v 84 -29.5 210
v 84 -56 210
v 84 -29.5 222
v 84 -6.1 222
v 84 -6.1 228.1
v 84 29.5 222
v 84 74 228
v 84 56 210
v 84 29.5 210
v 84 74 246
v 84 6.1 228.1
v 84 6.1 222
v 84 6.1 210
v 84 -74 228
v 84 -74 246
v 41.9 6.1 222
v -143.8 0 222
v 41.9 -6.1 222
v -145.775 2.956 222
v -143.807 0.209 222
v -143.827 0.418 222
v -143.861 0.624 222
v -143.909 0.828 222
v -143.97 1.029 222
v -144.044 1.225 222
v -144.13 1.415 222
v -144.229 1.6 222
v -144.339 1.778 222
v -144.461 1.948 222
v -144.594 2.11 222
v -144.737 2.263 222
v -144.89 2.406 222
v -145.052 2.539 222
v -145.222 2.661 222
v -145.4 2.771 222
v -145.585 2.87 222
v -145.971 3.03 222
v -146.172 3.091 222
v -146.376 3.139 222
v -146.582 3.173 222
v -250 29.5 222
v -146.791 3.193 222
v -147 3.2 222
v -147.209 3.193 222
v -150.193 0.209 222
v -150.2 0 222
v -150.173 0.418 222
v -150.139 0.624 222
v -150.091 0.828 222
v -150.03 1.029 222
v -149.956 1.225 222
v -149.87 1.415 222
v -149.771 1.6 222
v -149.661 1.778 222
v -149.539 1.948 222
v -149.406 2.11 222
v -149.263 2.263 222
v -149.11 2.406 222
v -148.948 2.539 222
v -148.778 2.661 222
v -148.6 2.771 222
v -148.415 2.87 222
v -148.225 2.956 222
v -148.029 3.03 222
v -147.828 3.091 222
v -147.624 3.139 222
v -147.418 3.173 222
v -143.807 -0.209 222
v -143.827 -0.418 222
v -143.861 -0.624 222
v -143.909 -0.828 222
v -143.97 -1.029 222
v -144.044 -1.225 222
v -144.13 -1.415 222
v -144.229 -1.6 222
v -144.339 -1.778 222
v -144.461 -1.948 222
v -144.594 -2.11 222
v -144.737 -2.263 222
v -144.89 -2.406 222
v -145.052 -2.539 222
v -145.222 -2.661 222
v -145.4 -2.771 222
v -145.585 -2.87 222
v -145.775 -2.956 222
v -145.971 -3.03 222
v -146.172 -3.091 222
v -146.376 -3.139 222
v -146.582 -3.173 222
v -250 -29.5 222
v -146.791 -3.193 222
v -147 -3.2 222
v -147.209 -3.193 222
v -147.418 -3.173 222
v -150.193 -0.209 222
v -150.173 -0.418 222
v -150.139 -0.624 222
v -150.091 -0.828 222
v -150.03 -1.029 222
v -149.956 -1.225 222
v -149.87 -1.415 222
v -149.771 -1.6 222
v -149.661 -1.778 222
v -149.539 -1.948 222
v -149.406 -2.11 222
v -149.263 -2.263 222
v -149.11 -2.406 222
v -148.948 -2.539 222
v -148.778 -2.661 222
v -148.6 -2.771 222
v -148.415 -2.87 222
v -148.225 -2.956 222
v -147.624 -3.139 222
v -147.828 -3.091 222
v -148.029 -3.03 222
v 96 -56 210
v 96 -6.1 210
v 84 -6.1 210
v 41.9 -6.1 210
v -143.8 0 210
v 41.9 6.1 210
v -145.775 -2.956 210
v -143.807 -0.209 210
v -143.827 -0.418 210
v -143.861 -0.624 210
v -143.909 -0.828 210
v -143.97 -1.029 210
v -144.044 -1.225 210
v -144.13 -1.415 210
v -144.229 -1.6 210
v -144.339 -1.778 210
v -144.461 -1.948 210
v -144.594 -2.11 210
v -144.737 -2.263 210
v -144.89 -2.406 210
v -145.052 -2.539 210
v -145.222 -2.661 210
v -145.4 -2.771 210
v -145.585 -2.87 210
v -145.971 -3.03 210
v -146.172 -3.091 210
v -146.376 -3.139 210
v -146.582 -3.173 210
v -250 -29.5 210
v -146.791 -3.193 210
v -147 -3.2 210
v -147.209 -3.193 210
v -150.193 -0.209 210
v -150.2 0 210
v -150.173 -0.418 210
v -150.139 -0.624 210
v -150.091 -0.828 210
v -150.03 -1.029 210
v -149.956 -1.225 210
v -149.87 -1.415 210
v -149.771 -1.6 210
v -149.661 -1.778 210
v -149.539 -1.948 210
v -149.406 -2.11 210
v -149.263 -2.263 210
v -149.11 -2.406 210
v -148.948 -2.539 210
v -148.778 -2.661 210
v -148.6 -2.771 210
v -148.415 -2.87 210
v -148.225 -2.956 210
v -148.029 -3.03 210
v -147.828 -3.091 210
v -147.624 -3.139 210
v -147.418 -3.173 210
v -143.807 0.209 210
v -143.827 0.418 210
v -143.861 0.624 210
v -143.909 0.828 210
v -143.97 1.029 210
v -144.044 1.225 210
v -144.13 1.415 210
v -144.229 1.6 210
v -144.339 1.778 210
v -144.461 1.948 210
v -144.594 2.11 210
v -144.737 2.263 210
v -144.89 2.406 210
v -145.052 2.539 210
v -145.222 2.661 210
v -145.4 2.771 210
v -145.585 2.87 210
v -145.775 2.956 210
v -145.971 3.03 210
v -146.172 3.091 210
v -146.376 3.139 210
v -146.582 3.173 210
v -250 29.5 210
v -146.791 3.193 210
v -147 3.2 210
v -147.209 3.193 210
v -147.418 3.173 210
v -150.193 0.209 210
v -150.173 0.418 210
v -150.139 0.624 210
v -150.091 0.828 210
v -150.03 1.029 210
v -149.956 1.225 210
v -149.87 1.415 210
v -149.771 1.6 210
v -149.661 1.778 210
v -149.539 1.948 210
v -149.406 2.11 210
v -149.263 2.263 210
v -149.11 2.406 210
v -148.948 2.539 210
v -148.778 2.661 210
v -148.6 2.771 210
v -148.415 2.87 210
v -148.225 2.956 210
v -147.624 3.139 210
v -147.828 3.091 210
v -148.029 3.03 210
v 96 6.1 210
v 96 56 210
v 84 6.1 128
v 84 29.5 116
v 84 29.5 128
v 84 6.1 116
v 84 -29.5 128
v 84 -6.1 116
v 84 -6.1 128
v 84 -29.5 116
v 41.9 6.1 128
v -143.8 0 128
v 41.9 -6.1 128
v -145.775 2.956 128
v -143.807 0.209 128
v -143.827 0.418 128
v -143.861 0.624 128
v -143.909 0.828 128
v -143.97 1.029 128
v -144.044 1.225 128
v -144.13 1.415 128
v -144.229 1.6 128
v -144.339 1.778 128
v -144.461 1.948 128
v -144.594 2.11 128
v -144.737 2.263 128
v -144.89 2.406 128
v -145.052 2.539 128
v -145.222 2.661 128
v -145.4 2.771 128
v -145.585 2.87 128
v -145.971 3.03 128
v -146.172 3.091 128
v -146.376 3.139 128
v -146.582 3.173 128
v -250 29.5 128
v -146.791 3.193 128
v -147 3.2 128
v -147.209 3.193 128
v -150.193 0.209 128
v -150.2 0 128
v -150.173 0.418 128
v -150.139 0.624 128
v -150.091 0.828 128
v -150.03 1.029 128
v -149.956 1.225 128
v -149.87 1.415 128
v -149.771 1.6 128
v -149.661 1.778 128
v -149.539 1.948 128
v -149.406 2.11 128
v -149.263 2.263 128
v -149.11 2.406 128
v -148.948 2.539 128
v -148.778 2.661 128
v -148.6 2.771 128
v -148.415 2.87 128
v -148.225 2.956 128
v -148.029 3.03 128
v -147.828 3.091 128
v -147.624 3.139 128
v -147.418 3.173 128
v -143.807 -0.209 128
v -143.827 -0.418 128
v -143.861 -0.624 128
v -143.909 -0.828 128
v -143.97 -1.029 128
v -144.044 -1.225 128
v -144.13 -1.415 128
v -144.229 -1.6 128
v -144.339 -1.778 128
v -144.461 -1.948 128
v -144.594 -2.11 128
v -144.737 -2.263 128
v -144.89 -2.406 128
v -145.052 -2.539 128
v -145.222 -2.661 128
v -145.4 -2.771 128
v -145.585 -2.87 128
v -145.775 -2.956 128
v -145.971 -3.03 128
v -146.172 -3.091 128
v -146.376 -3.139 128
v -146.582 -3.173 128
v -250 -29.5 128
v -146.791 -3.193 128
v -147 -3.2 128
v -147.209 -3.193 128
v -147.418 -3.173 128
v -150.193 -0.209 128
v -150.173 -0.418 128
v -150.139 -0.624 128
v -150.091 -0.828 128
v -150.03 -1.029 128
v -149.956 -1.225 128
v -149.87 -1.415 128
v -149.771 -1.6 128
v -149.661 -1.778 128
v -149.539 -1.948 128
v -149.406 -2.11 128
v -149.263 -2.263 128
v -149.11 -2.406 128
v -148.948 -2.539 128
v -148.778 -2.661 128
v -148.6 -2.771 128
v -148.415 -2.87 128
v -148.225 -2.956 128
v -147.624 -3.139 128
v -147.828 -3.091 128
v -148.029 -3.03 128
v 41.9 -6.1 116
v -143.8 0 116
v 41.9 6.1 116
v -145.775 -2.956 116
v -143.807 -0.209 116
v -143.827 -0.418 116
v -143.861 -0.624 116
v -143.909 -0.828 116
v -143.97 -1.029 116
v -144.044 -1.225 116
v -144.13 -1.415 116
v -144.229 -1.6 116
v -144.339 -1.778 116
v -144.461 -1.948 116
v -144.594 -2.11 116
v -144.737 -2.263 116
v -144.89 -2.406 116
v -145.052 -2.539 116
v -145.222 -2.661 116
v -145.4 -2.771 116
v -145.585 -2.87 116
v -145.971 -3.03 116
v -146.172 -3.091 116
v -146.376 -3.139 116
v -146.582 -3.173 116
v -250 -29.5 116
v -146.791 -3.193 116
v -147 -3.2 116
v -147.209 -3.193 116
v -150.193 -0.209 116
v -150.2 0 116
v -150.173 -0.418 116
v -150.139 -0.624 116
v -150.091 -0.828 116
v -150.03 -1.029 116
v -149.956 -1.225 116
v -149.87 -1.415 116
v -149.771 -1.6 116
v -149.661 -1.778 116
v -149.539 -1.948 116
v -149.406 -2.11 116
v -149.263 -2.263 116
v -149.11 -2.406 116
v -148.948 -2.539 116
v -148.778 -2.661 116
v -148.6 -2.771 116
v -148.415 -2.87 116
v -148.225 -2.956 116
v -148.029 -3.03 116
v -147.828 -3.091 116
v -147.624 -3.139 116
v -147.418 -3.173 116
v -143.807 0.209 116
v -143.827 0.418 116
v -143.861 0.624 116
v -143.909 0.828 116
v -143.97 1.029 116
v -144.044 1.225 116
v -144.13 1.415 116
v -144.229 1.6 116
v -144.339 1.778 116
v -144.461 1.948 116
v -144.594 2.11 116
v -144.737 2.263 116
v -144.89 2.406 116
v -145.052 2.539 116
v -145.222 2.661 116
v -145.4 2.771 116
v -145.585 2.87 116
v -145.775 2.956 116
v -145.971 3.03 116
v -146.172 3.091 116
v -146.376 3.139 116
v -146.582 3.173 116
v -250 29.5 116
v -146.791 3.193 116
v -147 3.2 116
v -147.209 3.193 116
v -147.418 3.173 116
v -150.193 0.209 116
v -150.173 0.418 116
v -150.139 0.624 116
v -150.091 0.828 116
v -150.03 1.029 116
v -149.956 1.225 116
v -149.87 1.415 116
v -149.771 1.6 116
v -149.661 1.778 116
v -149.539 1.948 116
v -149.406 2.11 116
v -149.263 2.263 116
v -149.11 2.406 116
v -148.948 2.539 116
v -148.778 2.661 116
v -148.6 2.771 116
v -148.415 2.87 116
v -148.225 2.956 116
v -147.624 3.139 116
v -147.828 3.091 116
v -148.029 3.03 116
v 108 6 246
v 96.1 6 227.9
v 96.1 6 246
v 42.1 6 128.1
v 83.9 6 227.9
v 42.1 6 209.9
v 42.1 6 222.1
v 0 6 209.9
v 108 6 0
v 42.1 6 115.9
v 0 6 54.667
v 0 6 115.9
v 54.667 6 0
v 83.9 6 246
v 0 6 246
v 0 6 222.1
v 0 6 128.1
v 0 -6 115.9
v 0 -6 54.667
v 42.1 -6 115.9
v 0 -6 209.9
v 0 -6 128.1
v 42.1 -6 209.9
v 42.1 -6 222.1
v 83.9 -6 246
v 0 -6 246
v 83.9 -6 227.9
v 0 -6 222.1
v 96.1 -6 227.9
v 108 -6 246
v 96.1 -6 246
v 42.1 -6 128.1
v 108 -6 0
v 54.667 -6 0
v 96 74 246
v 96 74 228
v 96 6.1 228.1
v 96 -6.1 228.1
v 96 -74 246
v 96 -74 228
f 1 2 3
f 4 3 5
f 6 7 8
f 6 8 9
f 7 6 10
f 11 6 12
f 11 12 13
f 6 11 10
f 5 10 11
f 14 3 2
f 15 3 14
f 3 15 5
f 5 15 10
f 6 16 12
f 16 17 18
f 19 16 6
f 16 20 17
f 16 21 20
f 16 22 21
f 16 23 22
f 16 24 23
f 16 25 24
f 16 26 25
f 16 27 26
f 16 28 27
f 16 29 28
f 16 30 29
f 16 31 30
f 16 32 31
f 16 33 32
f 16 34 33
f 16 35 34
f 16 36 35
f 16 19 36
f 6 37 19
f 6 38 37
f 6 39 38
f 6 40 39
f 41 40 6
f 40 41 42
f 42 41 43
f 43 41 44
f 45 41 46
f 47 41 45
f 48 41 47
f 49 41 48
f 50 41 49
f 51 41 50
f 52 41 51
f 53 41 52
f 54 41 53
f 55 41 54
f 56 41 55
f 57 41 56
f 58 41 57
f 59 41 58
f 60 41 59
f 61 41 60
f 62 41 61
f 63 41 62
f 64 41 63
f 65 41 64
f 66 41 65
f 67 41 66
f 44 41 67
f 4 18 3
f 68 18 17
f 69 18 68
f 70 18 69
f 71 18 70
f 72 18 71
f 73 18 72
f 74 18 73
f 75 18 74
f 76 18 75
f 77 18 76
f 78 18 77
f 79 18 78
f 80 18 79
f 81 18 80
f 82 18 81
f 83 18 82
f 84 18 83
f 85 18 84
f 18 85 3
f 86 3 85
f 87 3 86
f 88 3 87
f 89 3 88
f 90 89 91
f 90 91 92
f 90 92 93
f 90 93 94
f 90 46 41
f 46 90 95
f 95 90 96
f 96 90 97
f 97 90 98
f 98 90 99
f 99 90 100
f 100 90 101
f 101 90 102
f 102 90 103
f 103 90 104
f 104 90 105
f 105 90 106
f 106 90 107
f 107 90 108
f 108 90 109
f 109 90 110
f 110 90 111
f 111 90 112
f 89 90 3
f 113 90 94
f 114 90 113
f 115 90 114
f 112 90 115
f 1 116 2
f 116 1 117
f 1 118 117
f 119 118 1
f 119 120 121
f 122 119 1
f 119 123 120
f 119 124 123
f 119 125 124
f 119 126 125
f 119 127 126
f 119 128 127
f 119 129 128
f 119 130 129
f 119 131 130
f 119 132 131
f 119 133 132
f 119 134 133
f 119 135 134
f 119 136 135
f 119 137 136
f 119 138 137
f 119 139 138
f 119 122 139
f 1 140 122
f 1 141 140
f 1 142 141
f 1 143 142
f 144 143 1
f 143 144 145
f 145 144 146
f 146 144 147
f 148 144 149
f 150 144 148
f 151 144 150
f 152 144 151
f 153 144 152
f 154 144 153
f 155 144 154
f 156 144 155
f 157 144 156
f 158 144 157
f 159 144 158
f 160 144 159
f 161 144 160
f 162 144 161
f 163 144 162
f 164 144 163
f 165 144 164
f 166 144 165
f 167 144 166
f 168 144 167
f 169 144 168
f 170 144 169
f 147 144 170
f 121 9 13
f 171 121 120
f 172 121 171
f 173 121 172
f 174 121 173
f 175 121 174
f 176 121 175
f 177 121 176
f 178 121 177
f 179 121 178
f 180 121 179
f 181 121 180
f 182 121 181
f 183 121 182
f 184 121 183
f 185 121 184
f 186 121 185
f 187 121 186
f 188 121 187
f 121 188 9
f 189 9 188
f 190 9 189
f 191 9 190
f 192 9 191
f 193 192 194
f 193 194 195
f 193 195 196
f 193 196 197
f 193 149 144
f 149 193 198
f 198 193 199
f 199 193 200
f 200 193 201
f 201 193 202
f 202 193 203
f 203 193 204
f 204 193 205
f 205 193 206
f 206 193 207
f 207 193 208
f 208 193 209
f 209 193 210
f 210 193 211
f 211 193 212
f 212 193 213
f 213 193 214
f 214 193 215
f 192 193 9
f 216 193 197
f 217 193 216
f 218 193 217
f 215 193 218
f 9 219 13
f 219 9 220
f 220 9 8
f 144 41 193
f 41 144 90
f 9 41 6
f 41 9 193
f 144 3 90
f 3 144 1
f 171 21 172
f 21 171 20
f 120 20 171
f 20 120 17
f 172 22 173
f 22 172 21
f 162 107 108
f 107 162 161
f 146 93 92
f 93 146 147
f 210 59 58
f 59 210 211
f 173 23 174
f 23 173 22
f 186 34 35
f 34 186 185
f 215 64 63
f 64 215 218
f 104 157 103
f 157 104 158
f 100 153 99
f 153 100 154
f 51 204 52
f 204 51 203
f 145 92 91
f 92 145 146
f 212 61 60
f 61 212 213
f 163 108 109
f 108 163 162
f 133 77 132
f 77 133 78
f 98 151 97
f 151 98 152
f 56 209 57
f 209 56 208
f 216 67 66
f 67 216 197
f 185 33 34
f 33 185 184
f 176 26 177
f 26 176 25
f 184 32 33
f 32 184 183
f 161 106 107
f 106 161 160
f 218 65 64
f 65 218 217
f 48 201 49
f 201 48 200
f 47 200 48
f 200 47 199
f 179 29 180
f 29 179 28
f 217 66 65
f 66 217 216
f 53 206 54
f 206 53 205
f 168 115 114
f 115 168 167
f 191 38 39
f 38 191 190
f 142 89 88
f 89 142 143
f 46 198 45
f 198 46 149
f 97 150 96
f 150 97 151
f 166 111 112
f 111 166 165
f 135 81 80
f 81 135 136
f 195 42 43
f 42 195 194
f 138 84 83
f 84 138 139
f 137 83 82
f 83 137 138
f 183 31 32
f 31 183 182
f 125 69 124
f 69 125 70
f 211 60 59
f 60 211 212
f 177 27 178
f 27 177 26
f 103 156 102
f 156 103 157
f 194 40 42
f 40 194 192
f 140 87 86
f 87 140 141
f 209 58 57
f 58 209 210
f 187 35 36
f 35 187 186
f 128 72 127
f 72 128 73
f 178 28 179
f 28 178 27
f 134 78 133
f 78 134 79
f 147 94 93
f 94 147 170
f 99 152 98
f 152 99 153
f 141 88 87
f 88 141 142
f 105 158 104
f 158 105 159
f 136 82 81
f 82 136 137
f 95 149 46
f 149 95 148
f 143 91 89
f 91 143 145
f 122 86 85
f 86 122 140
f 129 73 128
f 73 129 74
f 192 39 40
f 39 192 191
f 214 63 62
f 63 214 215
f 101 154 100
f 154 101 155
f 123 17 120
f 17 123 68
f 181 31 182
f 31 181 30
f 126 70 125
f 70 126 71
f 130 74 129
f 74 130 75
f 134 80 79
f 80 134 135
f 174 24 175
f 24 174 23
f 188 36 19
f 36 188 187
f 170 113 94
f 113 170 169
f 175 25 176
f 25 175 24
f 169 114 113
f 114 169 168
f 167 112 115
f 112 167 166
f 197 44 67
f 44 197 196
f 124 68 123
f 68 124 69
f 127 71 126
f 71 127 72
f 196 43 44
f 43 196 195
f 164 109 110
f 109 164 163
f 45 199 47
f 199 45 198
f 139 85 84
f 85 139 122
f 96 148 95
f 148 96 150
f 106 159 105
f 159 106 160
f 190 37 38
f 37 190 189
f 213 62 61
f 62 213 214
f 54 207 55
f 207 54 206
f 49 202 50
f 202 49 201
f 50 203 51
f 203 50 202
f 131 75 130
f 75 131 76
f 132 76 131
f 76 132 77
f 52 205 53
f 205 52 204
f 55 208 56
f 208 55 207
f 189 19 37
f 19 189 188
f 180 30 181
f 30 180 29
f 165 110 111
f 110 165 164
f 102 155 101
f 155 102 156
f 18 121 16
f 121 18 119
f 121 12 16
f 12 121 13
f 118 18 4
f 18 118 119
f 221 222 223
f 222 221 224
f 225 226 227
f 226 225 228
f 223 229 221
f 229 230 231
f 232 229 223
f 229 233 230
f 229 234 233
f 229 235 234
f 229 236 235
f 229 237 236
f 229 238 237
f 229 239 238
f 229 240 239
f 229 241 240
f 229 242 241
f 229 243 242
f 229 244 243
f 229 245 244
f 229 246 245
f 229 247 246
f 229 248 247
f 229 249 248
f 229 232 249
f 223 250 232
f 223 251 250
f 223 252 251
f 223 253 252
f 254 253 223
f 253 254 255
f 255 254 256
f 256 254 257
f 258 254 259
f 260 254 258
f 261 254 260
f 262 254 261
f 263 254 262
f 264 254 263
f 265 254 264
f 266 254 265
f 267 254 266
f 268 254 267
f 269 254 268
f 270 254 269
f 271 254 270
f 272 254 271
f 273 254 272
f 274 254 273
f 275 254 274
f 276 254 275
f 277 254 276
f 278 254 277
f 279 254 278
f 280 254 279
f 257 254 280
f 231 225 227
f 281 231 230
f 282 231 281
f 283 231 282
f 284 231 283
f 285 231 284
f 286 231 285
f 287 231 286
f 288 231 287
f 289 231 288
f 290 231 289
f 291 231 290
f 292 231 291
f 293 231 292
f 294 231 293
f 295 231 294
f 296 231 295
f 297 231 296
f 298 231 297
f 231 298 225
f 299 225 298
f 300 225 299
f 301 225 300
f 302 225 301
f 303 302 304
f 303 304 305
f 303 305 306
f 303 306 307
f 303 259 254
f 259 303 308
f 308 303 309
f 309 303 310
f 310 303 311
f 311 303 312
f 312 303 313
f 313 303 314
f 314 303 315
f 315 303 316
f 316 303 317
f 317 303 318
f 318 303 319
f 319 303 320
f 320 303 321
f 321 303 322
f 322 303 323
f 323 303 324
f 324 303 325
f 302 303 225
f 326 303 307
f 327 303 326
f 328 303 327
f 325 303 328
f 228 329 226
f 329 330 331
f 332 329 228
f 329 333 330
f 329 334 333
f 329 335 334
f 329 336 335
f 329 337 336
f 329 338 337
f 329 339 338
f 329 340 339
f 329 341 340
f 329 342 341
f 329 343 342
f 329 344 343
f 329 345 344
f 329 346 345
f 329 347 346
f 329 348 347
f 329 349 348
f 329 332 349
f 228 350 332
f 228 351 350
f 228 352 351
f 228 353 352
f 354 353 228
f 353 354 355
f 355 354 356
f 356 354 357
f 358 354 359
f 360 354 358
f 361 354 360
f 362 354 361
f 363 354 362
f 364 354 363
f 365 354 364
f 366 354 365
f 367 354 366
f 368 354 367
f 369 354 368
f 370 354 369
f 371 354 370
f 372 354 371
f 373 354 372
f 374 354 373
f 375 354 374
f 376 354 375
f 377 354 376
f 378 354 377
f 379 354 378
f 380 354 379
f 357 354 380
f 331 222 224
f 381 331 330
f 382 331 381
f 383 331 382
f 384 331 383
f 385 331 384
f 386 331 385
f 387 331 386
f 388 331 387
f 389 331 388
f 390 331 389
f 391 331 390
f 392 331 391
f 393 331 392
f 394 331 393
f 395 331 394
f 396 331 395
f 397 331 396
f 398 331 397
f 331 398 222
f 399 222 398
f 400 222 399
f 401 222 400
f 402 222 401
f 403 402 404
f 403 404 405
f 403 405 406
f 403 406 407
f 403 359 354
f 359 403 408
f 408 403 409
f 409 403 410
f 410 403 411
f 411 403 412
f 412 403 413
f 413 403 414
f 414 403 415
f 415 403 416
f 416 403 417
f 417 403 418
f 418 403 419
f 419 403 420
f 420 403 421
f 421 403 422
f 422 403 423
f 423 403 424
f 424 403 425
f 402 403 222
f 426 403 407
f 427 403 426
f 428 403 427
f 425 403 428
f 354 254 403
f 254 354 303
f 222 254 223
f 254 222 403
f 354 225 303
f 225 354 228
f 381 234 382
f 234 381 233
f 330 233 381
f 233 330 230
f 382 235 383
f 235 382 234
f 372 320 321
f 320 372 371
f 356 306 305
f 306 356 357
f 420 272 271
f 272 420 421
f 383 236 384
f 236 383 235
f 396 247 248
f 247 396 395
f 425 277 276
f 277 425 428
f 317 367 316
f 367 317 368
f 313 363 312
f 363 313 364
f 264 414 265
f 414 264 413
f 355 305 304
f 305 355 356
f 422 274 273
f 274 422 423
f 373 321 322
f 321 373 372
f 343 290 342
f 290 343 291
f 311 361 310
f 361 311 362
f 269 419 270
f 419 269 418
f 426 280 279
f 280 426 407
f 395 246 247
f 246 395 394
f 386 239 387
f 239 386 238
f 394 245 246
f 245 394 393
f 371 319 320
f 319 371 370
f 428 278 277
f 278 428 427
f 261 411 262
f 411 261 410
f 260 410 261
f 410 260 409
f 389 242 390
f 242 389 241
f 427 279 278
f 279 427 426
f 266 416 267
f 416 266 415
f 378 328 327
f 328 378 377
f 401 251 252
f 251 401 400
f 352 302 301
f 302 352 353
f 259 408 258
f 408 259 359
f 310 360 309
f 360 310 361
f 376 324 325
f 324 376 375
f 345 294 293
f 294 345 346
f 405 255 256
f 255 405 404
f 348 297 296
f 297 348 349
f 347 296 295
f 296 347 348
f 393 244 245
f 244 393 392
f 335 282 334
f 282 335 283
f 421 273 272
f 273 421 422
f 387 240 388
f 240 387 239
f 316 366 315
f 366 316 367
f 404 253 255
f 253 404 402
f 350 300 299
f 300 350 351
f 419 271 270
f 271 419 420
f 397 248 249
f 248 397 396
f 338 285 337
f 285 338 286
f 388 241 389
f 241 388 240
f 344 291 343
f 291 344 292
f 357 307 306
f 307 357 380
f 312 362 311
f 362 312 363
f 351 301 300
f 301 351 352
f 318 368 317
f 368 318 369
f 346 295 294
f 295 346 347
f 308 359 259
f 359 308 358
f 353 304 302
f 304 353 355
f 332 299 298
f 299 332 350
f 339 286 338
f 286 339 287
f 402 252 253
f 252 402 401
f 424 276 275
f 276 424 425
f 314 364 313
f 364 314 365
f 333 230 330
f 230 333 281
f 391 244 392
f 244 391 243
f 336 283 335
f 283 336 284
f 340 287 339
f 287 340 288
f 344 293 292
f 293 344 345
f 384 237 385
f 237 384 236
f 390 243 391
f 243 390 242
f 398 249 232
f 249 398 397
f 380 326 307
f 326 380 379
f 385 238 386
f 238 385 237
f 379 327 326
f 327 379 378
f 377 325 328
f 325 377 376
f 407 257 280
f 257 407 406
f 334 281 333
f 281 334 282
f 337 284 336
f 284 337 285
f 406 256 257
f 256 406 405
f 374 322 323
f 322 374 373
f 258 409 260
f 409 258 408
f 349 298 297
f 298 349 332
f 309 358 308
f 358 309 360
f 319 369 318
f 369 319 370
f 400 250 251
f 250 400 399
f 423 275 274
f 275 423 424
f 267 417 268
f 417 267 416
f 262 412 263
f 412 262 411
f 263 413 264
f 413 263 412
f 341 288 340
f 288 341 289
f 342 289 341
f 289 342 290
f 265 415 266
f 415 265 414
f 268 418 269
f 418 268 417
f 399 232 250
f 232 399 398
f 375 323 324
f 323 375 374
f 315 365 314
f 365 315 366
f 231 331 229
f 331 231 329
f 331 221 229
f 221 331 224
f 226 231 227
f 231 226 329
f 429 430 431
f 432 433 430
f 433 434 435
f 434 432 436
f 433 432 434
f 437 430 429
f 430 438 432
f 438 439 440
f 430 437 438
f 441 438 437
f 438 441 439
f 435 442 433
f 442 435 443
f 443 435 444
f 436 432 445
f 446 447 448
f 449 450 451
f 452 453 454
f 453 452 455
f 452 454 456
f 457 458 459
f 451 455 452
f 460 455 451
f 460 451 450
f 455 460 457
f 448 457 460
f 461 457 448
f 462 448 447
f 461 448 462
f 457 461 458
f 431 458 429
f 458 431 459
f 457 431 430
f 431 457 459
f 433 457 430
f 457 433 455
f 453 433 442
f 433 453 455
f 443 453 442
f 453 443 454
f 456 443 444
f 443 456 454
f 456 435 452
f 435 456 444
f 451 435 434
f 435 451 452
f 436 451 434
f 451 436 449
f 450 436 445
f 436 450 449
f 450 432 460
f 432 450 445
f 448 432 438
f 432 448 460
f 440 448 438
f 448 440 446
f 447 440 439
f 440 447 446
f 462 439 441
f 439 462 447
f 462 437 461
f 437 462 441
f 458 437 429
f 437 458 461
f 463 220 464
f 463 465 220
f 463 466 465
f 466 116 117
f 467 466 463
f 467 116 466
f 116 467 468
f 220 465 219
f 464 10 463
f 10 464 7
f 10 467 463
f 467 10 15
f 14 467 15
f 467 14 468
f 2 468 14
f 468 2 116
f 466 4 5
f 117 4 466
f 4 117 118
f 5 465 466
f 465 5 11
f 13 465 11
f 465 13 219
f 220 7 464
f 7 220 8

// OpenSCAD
// ==========================================================================
//  GENERATED FILE -- DO NOT EDIT.
//  Produced by build/build.py from components/Turtle_Rear_Fin_v1.scad
//  Turtle Body version 1.9.0
//  Edit lib/ and src/ instead, then run: python3 build/build.py
// ==========================================================================
/*
 Hope Turtle rear fin. Units: mm. License: CERN-OHL-S-2.0.
 Four wooden pieces: yellow fin, two green bottle-holder shafts, red solar
 crossbar. Panel + bottle are F5 reference only, excluded from F6/STL.
 Shaft length 334. Slot openings 12.2 mm (0.2 mm TOTAL, centred).
 TB-07: green-slat mounting hole is 103 mm from the shaft front, matching
 the assembled Turtle (was a fixed 50 mm).

 SOURCE FILE — geometry lives in lib/rear_fin.scad + lib/params.scad.
 The committed self-contained file is generated by build/build.py.
*/

/* [Fit and tuning] */
half_lap_clearance   = 0.2; // TOTAL extra slot width, centred on the board
solar_slot_clearance = 0.2;
exploded = 0;

/* [Display] */
part = "assembly"; // [assembly,fin,solar_holder,shaft]
show_solar_panel = true;   // F5 reference only, excluded from F6/STL
show_bottle_mockup = false; // reserved
enable_color_coding = true; // wooden parts; false = the rear fin's own shades of brown

/* [Render] */
fn = 96;

// [bundle] begin use <../../lib/rear_fin.scad>
// ==========================================================================
//  Turtle Body -- rear fin + solar-panel support  (lib module)
// --------------------------------------------------------------------------
//  One yellow vertical fin, two green bottle-holder shafts, one red solar
//  crossbar. In the standalone the panel + bottle are %-reference only and
//  excluded from F6/STL. See CLAUDE.md s11.
//
//  Shaft length keeps the approved formula 305 + (2/3)(93-24) - 17 = 334.
//  Half-lap and solar-joint clearances are 0.2 mm TOTAL, centred on the
//  12 mm board (slot opening 12.2 mm, not 12.4). TB-07: the green-slat
//  mounting hole is p_rear_shaft_hole_from_front() (103 mm at defaults),
//  matching the assembled Turtle -- not the old fixed 50 mm.
//
//  Definitions only. Geometry is emitted by rear_fin_assembly() or the
//  individual part modules.
// ==========================================================================

// [bundle] begin use <params.scad>
// ==========================================================================
//  Turtle Body -- shared dimension contract
// --------------------------------------------------------------------------
//  The single source of truth for every dimension that more than one
//  subsystem depends on. Values are exposed as zero-argument functions so
//  this file can be pulled in with `use <params.scad>` (which ignores
//  top-level variable assignments) without polluting any namespace.
//
//  lib/ modules take these as DEFAULT argument values:
//      module control_cap(roof_t = p_cap_roof_t(), ...) { ... }
//  so a src/ wrapper can still override one value from its customizer block
//  while every other subsystem keeps the shared number.
//
//  Rules:
//   * one function per concept, canonical name (see CLAUDE.md cross-file table)
//   * derived values are functions of other p_*() functions, never re-typed
//   * mm throughout; names say _d (diameter), _r (radius), _t (thickness),
//     _len / _h (axial), _af (hex across-flats)
//   * do NOT add a bare `x = ...;` here -- bundle.py / lint.py will reject it
// ==========================================================================

// ---- tolerances and render quality --------------------------------------
function p_eps()          = 0.02;   // Boolean overlap / cut-through fudge
function p_fit_clearance() = 0.2;   // wood joint: TOTAL extra slot width, centred on the board
function p_fn_plastic()   = 120;    // printed PLA parts (cap, cage, axle, mold)
function p_fn_wood()      = 96;     // cut wooden parts
function p_fn_curve()     = 180;    // fine profile curves (bottle, sails)

// ---- bottle (the foundation reference) ---------------------------------
function p_bottle_d()        = 82;    // outside diameter
function p_bottle_h()        = 305;   // total height incl. ordinary screw cap
function p_bottle_wall_t()   = 0.5;   // modelling assumption, not a measurement
function p_bottle_cap_d()    = 31;    // ordinary screw cap (NOT the control-cap disk)
function p_bottle_cap_h()    = 17;    // ordinary screw cap height (rear-fin / ballast formulas)
function p_collar_d()        = 34;    // bottle collar, independent of cap diameter
function p_top_dome_h()      = 62;
function p_bottom_dome_h()   = 25;
function p_dome_power()      = 2.5;   // superellipse exponent
function p_bottle_neck_h()   = 5;
function p_bottle_collar_h() = 1;
function p_bottle_neck_d()   = p_bottle_cap_d() - 3;   // 28: neck is 3 mm under the cap
function p_bottle_base_ratio() = 0.88; // slightly narrower footprint at the base
function p_bottle_profile_steps() = 16;
// cut bottle (control head): the lower dome is removed and a short socket is
// bored so the control-cap insert slides in. Cut plane sits 5 mm above the
// bottom dome height.
function p_bottle_cut_extra()  = 5;
function p_bottle_cut_height() = p_bottom_dome_h() + p_bottle_cut_extra();   // 30

// nominal bottle interior and the cap insert that enters it
function p_bottle_socket_d() = p_bottle_d() - 2 * p_bottle_wall_t();          // 81
function p_insert_shaft_radial_clearance() = 1;
function p_insert_shaft_d()  = p_bottle_socket_d()
                             - 2 * p_insert_shaft_radial_clearance();          // 79

// ---- wooden stock -----------------------------------------------------
function p_wood_t()          = 12;    // shared board / slat thickness
function p_fin_board_w()     = 93;    // shared fin-system stock width
function p_screw_side_offset() = 25;  // mounting-hole inset from a John end

// ---- Ecojoiner port --------------------------------------------------
// A port must swallow the bottle's tapered top (the top dome) plus a seating
// allowance, so its axial length is DERIVED from the bottle, not fixed. This
// is the same rule the HopeTurtles.org generators use
// (port_length = taper_height + port_allowance); until 2026-09-08 lib carried
// the evaluated constant 82 instead, which silently broke the rule for any
// bottle other than the reference one. Ballast and Ecojoiner both read it.
function p_port_allowance()  = 20;                 // seating allowance beyond the dome
function p_port_length()     = p_top_dome_h() + p_port_allowance();   // 62 + 20 = 82
function p_port_height()     = p_bottle_d();       // opening height == bottle diameter (asserted)

// ---- M6 hardware ---------------------------------------------------
function p_m6_clearance_d()  = 6.4;   // M6 clearance hole
function p_m6_bolt_shaft_d() = 6;     // visual placeholder only
function p_m6_bolt_head_d()  = 12;
function p_m6_bolt_head_t()  = 4;

// ---- control cap (large stationary disk; see CLAUDE.md s7) ----------
//  TB-03 resolution: repository 5 mm roof / 2 mm boss is authoritative;
//  the axle (below) is derived to this datum.
function p_cap_disk_d()      = 100;   // control-cap disk (independent of p_bottle_cap_d)
function p_cap_roof_t()      = 5;     // disk / roof thickness
function p_cap_boss_depth()  = 2;     // extra projection of the centre boss into the hollow cap
function p_cap_boss_d()      = 18;
function p_cap_insert_len()  = 35;    // straight insert shaft length
function p_cap_insert_wall_t() = 4;
function p_cap_entry_chamfer_h()     = 1;
function p_cap_entry_chamfer_delta() = 1;
function p_cap_axle_bore_d() = 8.6;   // 0.3 mm radial clearance to the Ø8 shaft
function p_cap_cage_radial_clearance() = 1;   // cap disk -> cage inner wall (radial)
function p_cap_total_h()     = p_cap_roof_t() + p_cap_insert_len();           // 40
function p_cap_bearing_len() = p_cap_roof_t() + p_cap_boss_depth();           // 7

// buttons (through both cap and cage)
function p_button_upper_d()  = 17;    // clearance hole in the cap
function p_button_axis()     = "y";   // "x" or "y"
function p_button_radius()   = 24;    // radial position of the two button centres (48 mm apart)

// ---- silicone seal grooves + rings (CLAUDE.md s8) ------------------
function p_seal_groove_count()      = 2;
function p_seal_groove_axial_h()    = 2;   // groove height
function p_seal_groove_radial_depth() = 2; // groove depth
function p_seal_groove1_from_shoulder() = 12;  // groove centre, measured from the insert SHOULDER
function p_seal_groove2_from_shoulder() = 25;
function p_seal_ring_axial_t()      = 1.5;  // cast ring thickness
function p_seal_ring_radial_w()     = 5;    // NOT validated; 3.5 was a suggested milder prototype
function p_seal_groove_root_d() = p_insert_shaft_d()
                                - 2 * p_seal_groove_radial_depth();            // 75

// ---- round / hex centre axle (CLAUDE.md s9) -----------------------
//  Derived to the 5/2 cap datum (TB-03/TB-04). round_inside_cap is measured
//  from the roof underside and INCLUDES the boss -- do not add the boss again.
function p_axle_round_d()        = 8;
function p_axle_round_ext()      = 1;    // projection above the cap's outer face
function p_axle_round_inside_cap() = p_cap_insert_len() - 5;  // 30: roof underside to round end (incl. boss)
function p_axle_round_len()      = p_axle_round_inside_cap() + p_cap_roof_t() + p_axle_round_ext();  // 36
function p_axle_hex_af()         = 10.0; // shaft across-flats (0.3 mm to the Ø10.3 cage bore)
function p_axle_hex_len()        = 23;
function p_axle_join_overlap()   = 0.2;  // hex<->round Boolean overlap
function p_axle_total_len()      = p_axle_hex_len() + p_axle_round_len();
function p_axle_hex_corner_d()   = p_axle_hex_af() / cos(30);                  // ~11.55
function p_magnet_d()            = 3;    // AS5600 sensing magnet recess
function p_magnet_t()            = 1;

// ---- axle rotary shaft O-ring (waterproofs the axle bore; cast in the mold) ----
//  A round-section O-ring seated in a gland in the control-cap bore, sealing
//  against the spinning round section of the axle. ID is tied to the shaft.
function p_axle_oring_cs()     = 2.0;                                   // cross-section
function p_axle_oring_id()     = p_axle_round_d();                      // 8 -- hugs the shaft
function p_axle_oring_od()     = p_axle_oring_id() + 2 * p_axle_oring_cs();          // 12
function p_axle_oring_mean_r() = (p_axle_oring_id() + p_axle_oring_cs()) / 2;        // 5
//  gland cut into the cap bore for it
function p_cap_oring_squeeze()      = 0.25;  // radial squeeze on the seal
function p_cap_oring_gland_od()     = p_axle_oring_od() - 2 * p_cap_oring_squeeze(); // 11.5
function p_cap_oring_gland_w()      = 1.3 * p_axle_oring_cs();                       // 2.6 axial
function p_cap_oring_gland_from_face() = 3.5; // gland centre, from the cap outer face, along the bore

// ---- rotating control cage (CLAUDE.md s6) ------------------------
function p_cage_wall_t()     = 6.5;   // radial wall thickness
function p_cage_roof_t()     = 6;     // roof / surface plate thickness
function p_cage_inner_d()    = p_cap_disk_d() + 2 * p_cap_cage_radial_clearance();   // 102
function p_cage_outer_d()    = p_cage_inner_d() + 2 * p_cage_wall_t();               // 115
function p_cage_skirt_depth()   = 44;   // roof underside to the ORIGINAL skirt rim
function p_cage_peak_extension() = 20;  // crest extends this far past the original rim
function p_cage_valley_wall_h()  = 10;  // minimum wall depth between mounts
function p_cage_total_h()    = p_cage_skirt_depth() + p_cage_roof_t();              // 50 (native)
function p_cage_notch_count()   = 4;
function p_cage_notch_w()    = 22.5;  // batten groove width
function p_cage_notch_depth() = 3.7;
function p_cage_wave_segments() = 240;
function p_cage_hub_d()      = 29;
function p_cage_pocket_d()   = 26;    // top clip pocket
function p_cage_pocket_depth() = 4;
function p_cage_hex_bore_af() = 10.3; // central hex bore (0.3 mm to the Ø10.0 shaft)
function p_cage_bearing_d()  = 9;     // hemispherical bearing bump
function p_cage_bearing_count() = 8;
function p_cage_bearing_pcd() = p_cap_disk_d() - p_cage_bearing_d() + 0.5;          // 91.5
function p_cage_top_hole_d() = 18;    // central button / access hole through the roof
function p_cage_mount_hole_d() = 3.2; // two M3 clearance holes per batten / groove
function p_cage_mount_pitch()  = 32;  // vertical pitch of the pair
function p_cage_lower_hole_from_tip() = 10;
// 45-deg outward chamfer on the roof-top outer edge (0 = sharp). The cage
// prints roof-face-down, so this bevel flares OUT from the bed and stays
// printable; it is masked away around each batten groove. See lib/control_cage.scad.
function p_cage_roof_bevel() = 4;

// ---- sail apparatus (CLAUDE.md s10) ---------------------------
function p_side_batten_h()   = 205;
function p_side_batten_w()   = 20;
function p_side_batten_radial_t() = 10;
function p_top_crossbar_len() = 6 * p_bottle_d();   // 492
function p_top_crossbar_w()  = 22;
function p_top_crossbar_t()  = p_wood_t();          // 12
function p_sail_bar_axle_hole_d() = 12;             // Ø12; fits the ~11.55 hex corner dia
function p_bottom_rail_len() = 3 * p_bottle_d();    // 246
function p_bottom_rail_bottle_clearance() = 1;
function p_sail_rail_color()  = [0.56, 0.39, 0.39]; // brown (top AND bottom rails)
function p_c_piece_color()    = [1.0, 0.52, 0.20];  // orange, retained

// ---- rear fin + solar support (CLAUDE.md s11) ----------------
function p_solar_panel_w() = 148;
function p_solar_panel_h() = 223;
function p_solar_panel_t() = 2.5;    // real panel, independent of wood thickness
function p_rear_shaft_len() = p_bottle_h()
                            + (2/3) * (p_fin_board_w() - 2 * p_wood_t())
                            - p_bottle_cap_h();                                 // 334
function p_rear_half_lap_engagement() = 42;   // green/yellow interlock depth
function p_rear_fin_tab_width() = 15;
function p_rear_shaft_width()   = 59;
// TB-07: the green-slat mounting hole follows the mating Ecojoiner John, not a
// fixed 50 mm. Derived from the install transform; the john_length/2 terms
// cancel, leaving a pure function of the shared contract (= 103 at defaults).
function p_rear_shaft_hole_from_front() =
    p_rear_shaft_len() - p_screw_side_offset() - p_bottle_h()
    + p_bottle_cap_h() + p_port_height();

// ---- ballast attachment (CLAUDE.md s12) ---------------------
function p_ballast_core_w()   = p_bottle_d() - 2 * p_wood_t();                  // 58
function p_ballast_core_len() = p_bottle_h() - p_bottle_cap_h() + 6 * p_wood_t();  // 360
function p_ballast_slat_gap() = p_bottle_d();          // clear inner-face gap
function p_ballast_slat_spacing() = p_bottle_d() + p_wood_t();                  // 94
function p_ballast_board_len() = 3.5 * p_bottle_d();   // 287
function p_ballast_fin_len()   = 3 * p_bottle_d();     // 246
function p_ballast_lock_w()    = 5 * p_wood_t();       // 60

// ---- neutral wood shades (used when enable_color_coding = false) -------
// With the full colour code off, every wooden subsystem still renders in its
// OWN shade of brown so the parts stay visually separable. All are warm browns
// (R > G > B) spaced by lightness. The two large fins share one darker shade so
// they read as a matched pair, distinct from the rest of their own assembly.
function p_wood_shade_sail()     = [0.85, 0.66, 0.47]; // sail frame  (lightest)
function p_wood_shade_rear_fin() = [0.72, 0.50, 0.33]; // rear-fin shafts + solar holder
function p_wood_shade_eco()      = [0.62, 0.44, 0.28]; // Ecojoiner core
function p_wood_shade_ballast()  = [0.52, 0.34, 0.22]; // ballast slats / board / locks
function p_wood_shade_fin()      = [0.40, 0.26, 0.17]; // rear fin + ballast fin, shared (darkest)
// [bundle] end   <params.scad>
// [bundle] begin use <util.scad>
// ==========================================================================
//  Turtle Body -- shared helper modules and functions
// --------------------------------------------------------------------------
//  Small pieces that were copy-pasted across the standalone files. Geometry
//  lives in the per-subsystem lib/ modules; this file is only glue.
//
//  Definitions only -- no top-level geometry, no top-level assignments.
// ==========================================================================

// [bundle] begin use <params.scad>
// [bundle] already inlined: params.scad
// [bundle] end   <params.scad>

// Colour wrapper for wooden parts. When colour coding is off, every wooden
// component renders in one neutral wood tone; bottles, hardware, sails and
// printed parts keep their own colours and never call this.
module wood_color(coded_color, enabled = true, neutral = [0.94, 0.83, 0.62]) {
    color(enabled ? coded_color : neutral) children();
}

// scalar clamp
function clamp(v, lo, hi) = v < lo ? lo : (v > hi ? hi : v);

// Visual-only M6 bolt: plain shaft + hex-less cylindrical head. No thread,
// no torque rating -- a placeholder for fit inspection.
//  Local Z=0 is the underside of the head; the shaft runs toward +Z from Z=0
//  (plus an optional tip_extension), the head sits at Z=-head_t..0. Matches
//  the standalone files.
module m6_bolt_placeholder(grip_length, tip_extension = 1,
                           shaft_d = undef, head_d = undef, head_t = undef,
                           color_rgb = [0.15, 0.15, 0.15], fn = 48) {
    sd = shaft_d == undef ? p_m6_bolt_shaft_d() : shaft_d;
    hd = head_d  == undef ? p_m6_bolt_head_d()  : head_d;
    ht = head_t  == undef ? p_m6_bolt_head_t()  : head_t;
    assert(grip_length > 0, "m6_bolt_placeholder: grip_length must be positive.");
    color(color_rgb)
        union() {
            cylinder(d = sd, h = grip_length + tip_extension, $fn = fn);
            translate([0, 0, -ht])
                cylinder(d = hd, h = ht, $fn = fn);
        }
}

// Regular hexagonal prism specified by across-flats width (OpenSCAD's
// cylinder($fn=6) is specified across corners, which is the usual trap).
module hex_prism_af(across_flats, h, center = false) {
    cylinder(d = across_flats / cos(30), h = h, $fn = 6, center = center);
}
// [bundle] end   <util.scad>

function rf_t()             = p_wood_t();
function rf_fin_width()     = p_fin_board_w() + p_rear_fin_tab_width();          // 108
function rf_fin_height()    = 3 * p_bottle_d();                                  // 246
function rf_diag()          = (2/3) * p_bottle_d();                              // 54.667
function rf_shaft_length()  = p_rear_shaft_len();                               // 334
function rf_shaft_width()   = p_rear_shaft_width();                             // 59
function rf_solar_holder_len() = p_solar_panel_w();                            // 148
function rf_solar_holder_h()   = 3 * rf_t();                                    // 36
function rf_solar_chamfer()    = 1.5 * rf_t();                                  // 18
function rf_solar_slot_depth() = rf_solar_holder_h() / 2;                       // 18
function rf_solar_notch_x0()   = rf_fin_width() - 2 * rf_t();                    // 84
function rf_shaft_rear_x()     = rf_solar_notch_x0();                            // 84
function rf_shaft_front_x()    = rf_shaft_rear_x() - rf_shaft_length();
function rf_joint_meet_x()     = rf_shaft_rear_x() / 2;
function rf_upper_shaft_z0()   = rf_fin_height() - 3 * rf_t();
function rf_lower_shaft_z0()   = rf_upper_shaft_z0() - p_bottle_d() - rf_t();
function rf_solar_meet_z()     = rf_upper_shaft_z0() + rf_solar_slot_depth();

module rf_assert_valid(half_lap, solar_clear, hole_from_front, hole_d) {
    t = rf_t();
    assert(t > 0 && p_bottle_h() > p_bottle_cap_h() && p_bottle_cap_d() > 0);
    assert(p_bottle_d() > 0 && p_fin_board_w() > 2 * t && p_rear_fin_tab_width() > 0);
    assert(p_solar_panel_w() > 0 && p_solar_panel_h() > 0 && p_solar_panel_t() > 0);
    assert(half_lap >= 0 && solar_clear >= 0);
    assert(rf_shaft_front_x() < 0 && rf_joint_meet_x() > half_lap / 2);
    assert(rf_shaft_width() > t + half_lap);
    assert(half_lap < t && half_lap < p_bottle_d());
    assert(rf_lower_shaft_z0() - half_lap / 2 >= rf_diag(),
           "rear_fin: lower joint intersects the diagonal fin edge.");
    assert(rf_fin_width() > rf_diag());
    assert(solar_clear < t && rf_solar_notch_x0() > solar_clear / 2);
    assert(2 * rf_solar_chamfer() + t + solar_clear < rf_solar_holder_len(),
           "rear_fin: panel width leaves too little red-board material beside the slot.");
    assert(hole_d > 0 && rf_shaft_width() > hole_d);
    assert(hole_from_front > hole_d / 2
           && rf_shaft_front_x() + hole_from_front + hole_d / 2 < 0,
           "rear_fin: shaft hole must stay in the forward, unjointed portion.");
}

module rear_fin(half_lap = p_fit_clearance(), solar_clear = p_fit_clearance(),
                fn = undef, colored = true) {
    t = rf_t(); eps = p_eps();
    nn = fn == undef ? p_fn_wood() : fn;
    // colour code: yellow fin. Neutral: p_wood_shade_fin(), shared with the
    // ballast fin so the two large fins read as a pair.
    wood_color([1, 0.72, 0.05], colored, p_wood_shade_fin()) rotate([90, 0, 0])
        linear_extrude(height = t, center = true, $fn = nn) difference() {
            polygon([[0, rf_diag()], [rf_diag(), 0],
                     [rf_fin_width(), 0], [rf_fin_width(), rf_fin_height()],
                     [0, rf_fin_height()]]);
            for (z = [rf_upper_shaft_z0(), rf_lower_shaft_z0()])
                translate([-eps, z - half_lap / 2])
                    square([rf_joint_meet_x() + half_lap / 2 + eps, t + half_lap]);
            translate([rf_solar_notch_x0() - solar_clear / 2,
                       rf_solar_meet_z() - solar_clear / 2])
                square([t + solar_clear,
                        rf_fin_height() - rf_solar_meet_z() + solar_clear / 2 + eps]);
        }
}

module bottle_holder_shaft(z0 = 0, half_lap = p_fit_clearance(),
                           hole_from_front = undef, hole_d = undef, fn = undef,
                           colored = true) {
    t = rf_t(); eps = p_eps();
    nn  = fn == undef ? p_fn_wood() : fn;
    hff = hole_from_front == undef ? p_rear_shaft_hole_from_front() : hole_from_front;
    hd  = hole_d == undef ? p_m6_clearance_d() : hole_d;
    wood_color([0.2, 0.38, 0.05], colored, p_wood_shade_rear_fin()) difference() {
        translate([rf_shaft_front_x(), -rf_shaft_width() / 2, z0])
            cube([rf_shaft_length(), rf_shaft_width(), t]);
        translate([rf_shaft_front_x() + hff, 0, z0 - eps])
            cylinder(d = hd, h = t + 2 * eps, $fn = nn);
        translate([rf_joint_meet_x() - half_lap / 2, -(t + half_lap) / 2, z0 - eps])
            cube([rf_shaft_rear_x() - rf_joint_meet_x() + half_lap / 2 + eps,
                  t + half_lap, t + 2 * eps]);
    }
}

module solar_panel_holder(solar_clear = p_fit_clearance(), fn = undef,
                          colored = true) {
    t = rf_t(); eps = p_eps();
    nn = fn == undef ? p_fn_wood() : fn;
    L = rf_solar_holder_len(); H = rf_solar_holder_h(); ch = rf_solar_chamfer();
    wood_color("red", colored, p_wood_shade_rear_fin())
        translate([rf_solar_notch_x0(), 0, rf_upper_shaft_z0()])
        rotate([90, 0, 90]) translate([-L / 2, 0, 0])
            linear_extrude(height = t, $fn = nn) difference() {
                square([L, H]);
                polygon([[0, 0], [ch, 0], [0, ch]]);
                polygon([[L, 0], [L - ch, 0], [L, ch]]);
                translate([(L - t - solar_clear) / 2, -eps])
                    square([t + solar_clear, rf_solar_slot_depth() + solar_clear / 2 + eps]);
            }
}

module rear_fin_assembly(half_lap = p_fit_clearance(), solar_clear = p_fit_clearance(),
                         exploded = 0, fn = undef, colored = true) {
    rf_assert_valid(half_lap, solar_clear,
                    p_rear_shaft_hole_from_front(), p_m6_clearance_d());
    rear_fin(half_lap, solar_clear, fn, colored);
    translate([-exploded, 0,  exploded]) bottle_holder_shaft(rf_upper_shaft_z0(), half_lap, fn = fn, colored = colored);
    translate([-exploded, 0, -exploded]) bottle_holder_shaft(rf_lower_shaft_z0(), half_lap, fn = fn, colored = colored);
    translate([ exploded, 0,  exploded]) solar_panel_holder(solar_clear, fn, colored);

    echo("REAR FIN: shaft length = ", rf_shaft_length(),
         " | hole from front (TB-07) = ", p_rear_shaft_hole_from_front(),
         " | slot opening = ", rf_t() + half_lap);
}
// [bundle] end   <../../lib/rear_fin.scad>
// [bundle] begin use <../../lib/params.scad>
// [bundle] already inlined: params.scad
// [bundle] end   <../../lib/params.scad>

module _panel_reference() {
    // width -> Y, height/length -> X, thickness -> Z; extends forward from the crossbar
    x0 = rf_solar_notch_x0() + p_wood_t() - p_solar_panel_h();
    color([0.05, 0.16, 0.4, 0.65])
        translate([x0, -p_solar_panel_w() / 2, rf_fin_height()])
            cube([p_solar_panel_h(), p_solar_panel_w(), p_solar_panel_t()]);
}

if (part == "assembly") {
    rear_fin_assembly(half_lap = half_lap_clearance,
                      solar_clear = solar_slot_clearance,
                      exploded = exploded, fn = fn,
                      colored = enable_color_coding);
    if (show_solar_panel && exploded == 0) %_panel_reference();
} else if (part == "fin") {
    rear_fin(half_lap = half_lap_clearance, solar_clear = solar_slot_clearance, fn = fn,
             colored = enable_color_coding);
} else if (part == "solar_holder") {
    solar_panel_holder(solar_clear = solar_slot_clearance, fn = fn,
                       colored = enable_color_coding);
} else if (part == "shaft") {
    bottle_holder_shaft(half_lap = half_lap_clearance, fn = fn,
                        colored = enable_color_coding);
} else {
    assert(false, str("Unknown part: ", part));
}
